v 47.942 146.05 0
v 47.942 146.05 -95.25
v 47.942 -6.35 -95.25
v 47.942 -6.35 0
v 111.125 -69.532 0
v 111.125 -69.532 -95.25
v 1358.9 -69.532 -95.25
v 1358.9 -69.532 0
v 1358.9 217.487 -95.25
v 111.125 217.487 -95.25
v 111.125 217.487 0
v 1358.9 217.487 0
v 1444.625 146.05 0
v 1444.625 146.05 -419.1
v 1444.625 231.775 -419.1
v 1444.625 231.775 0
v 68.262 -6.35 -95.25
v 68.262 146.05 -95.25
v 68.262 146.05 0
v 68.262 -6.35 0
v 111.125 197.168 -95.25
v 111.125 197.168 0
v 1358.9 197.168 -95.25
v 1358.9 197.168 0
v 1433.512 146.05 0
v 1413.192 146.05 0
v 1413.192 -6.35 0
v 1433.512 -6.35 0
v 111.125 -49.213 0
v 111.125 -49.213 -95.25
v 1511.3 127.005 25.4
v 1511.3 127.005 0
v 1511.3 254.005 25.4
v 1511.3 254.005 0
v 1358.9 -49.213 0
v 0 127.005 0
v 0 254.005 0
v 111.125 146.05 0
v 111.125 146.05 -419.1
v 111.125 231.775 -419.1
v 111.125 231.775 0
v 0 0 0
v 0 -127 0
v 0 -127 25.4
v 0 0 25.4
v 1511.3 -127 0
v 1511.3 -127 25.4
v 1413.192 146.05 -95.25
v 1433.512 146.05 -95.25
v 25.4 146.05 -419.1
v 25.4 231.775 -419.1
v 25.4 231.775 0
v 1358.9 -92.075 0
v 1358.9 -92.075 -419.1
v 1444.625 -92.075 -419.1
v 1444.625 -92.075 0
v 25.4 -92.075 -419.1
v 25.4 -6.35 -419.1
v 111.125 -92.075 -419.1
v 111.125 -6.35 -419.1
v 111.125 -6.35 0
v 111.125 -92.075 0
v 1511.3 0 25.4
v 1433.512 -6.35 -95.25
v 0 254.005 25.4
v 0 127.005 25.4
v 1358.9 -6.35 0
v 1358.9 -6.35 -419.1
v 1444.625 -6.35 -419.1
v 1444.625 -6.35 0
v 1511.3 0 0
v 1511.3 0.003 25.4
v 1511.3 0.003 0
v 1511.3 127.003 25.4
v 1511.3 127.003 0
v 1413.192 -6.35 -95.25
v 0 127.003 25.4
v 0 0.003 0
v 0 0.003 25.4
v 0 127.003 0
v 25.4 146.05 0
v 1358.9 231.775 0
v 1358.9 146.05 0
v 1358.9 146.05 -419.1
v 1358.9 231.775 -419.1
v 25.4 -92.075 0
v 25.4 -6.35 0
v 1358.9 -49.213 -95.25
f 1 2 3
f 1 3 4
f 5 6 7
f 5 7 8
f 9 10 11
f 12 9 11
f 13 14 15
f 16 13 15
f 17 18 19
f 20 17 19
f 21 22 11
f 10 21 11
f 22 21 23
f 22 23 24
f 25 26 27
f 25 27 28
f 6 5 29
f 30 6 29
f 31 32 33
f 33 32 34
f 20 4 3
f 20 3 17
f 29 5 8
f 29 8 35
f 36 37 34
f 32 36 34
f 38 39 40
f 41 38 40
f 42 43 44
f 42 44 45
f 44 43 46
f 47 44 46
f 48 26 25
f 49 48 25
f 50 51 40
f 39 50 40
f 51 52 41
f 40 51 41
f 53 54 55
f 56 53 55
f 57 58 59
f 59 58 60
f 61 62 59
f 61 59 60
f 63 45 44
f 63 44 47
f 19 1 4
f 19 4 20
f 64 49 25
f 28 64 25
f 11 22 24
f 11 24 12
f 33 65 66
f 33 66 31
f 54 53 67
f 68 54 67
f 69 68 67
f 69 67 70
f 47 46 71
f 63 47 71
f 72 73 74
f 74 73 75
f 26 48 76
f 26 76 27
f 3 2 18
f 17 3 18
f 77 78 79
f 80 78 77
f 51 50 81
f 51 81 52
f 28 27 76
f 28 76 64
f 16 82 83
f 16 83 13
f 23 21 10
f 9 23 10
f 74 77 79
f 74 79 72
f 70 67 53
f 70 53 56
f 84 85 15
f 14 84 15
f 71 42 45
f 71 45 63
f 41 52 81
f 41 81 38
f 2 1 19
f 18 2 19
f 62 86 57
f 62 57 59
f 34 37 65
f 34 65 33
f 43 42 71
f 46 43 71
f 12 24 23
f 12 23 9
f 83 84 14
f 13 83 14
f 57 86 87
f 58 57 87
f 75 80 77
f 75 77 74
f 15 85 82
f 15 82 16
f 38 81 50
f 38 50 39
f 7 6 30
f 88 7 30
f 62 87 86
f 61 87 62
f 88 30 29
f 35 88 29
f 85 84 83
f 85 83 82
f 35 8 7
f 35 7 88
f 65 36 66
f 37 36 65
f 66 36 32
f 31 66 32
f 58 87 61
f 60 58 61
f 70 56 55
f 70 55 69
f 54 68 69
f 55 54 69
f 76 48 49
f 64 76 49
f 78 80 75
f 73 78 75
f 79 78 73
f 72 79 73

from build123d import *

# Parameters (mm, degrees)
F0_W     = 1511.3
F0_H     = 127
F2_DEPTH = 25.4
F1_W     = 85.725
F1_H     = 85.725
F3_DEPTH = 419.1
F4_W     = 20.32
F4_H     = 95.25
F5_DEPTH = 1247.775
F6_W     = 20.32
F6_H     = 95.25
F7_DEPTH = 152.4


with BuildPart() as f2:
    # F0 (on Top) → F2 (new body)
    with BuildSketch(Plane.XY):
        with Locations((755.65, -63.5)):
            Rectangle(F0_W, F0_H)
        with Locations((755.65, 63.50254)):
            Rectangle(F0_W, F0_H)
        with Locations((755.65, 190.50508)):
            Rectangle(F0_W, F0_H)
    extrude(amount=F2_DEPTH)


with BuildPart() as f3:
    # F1 (on face) → F3 (new body)
    with BuildSketch(Plane.XY):
        with Locations((68.2625, 188.9125)):
            Rectangle(F1_W, F1_H)
        with Locations((68.2625, -49.2125)):
            Rectangle(F1_W, F1_H)
        with Locations((1401.7625, 188.9125)):
            Rectangle(F1_W, F1_H)
        with Locations((1401.7625, -49.2125)):
            Rectangle(F1_W, F1_H)
    extrude(amount=-F3_DEPTH)


with BuildPart() as f5:
    # F4 (on face) → F5 (new body, through all)
    with BuildSketch(Plane.YZ.offset(111.125)):
        with Locations((-59.3725, -47.625)):
            Rectangle(F4_W, F4_H)
        with Locations((207.3275, -47.625)):
            Rectangle(F4_W, F4_H)
    extrude(amount=F5_DEPTH)


with BuildPart() as f7:
    # F6 (on face) → F7 (new body)
    with BuildSketch(Plane.XZ.offset(-146.05)):
        with Locations((58.1025, -47.625)):
            Rectangle(F6_W, F6_H)
        with Locations((1423.3525, -47.625)):
            Rectangle(F6_W, F6_H)
    extrude(amount=F7_DEPTH)


solid = Compound([f2.part, f3.part, f5.part, f7.part])
